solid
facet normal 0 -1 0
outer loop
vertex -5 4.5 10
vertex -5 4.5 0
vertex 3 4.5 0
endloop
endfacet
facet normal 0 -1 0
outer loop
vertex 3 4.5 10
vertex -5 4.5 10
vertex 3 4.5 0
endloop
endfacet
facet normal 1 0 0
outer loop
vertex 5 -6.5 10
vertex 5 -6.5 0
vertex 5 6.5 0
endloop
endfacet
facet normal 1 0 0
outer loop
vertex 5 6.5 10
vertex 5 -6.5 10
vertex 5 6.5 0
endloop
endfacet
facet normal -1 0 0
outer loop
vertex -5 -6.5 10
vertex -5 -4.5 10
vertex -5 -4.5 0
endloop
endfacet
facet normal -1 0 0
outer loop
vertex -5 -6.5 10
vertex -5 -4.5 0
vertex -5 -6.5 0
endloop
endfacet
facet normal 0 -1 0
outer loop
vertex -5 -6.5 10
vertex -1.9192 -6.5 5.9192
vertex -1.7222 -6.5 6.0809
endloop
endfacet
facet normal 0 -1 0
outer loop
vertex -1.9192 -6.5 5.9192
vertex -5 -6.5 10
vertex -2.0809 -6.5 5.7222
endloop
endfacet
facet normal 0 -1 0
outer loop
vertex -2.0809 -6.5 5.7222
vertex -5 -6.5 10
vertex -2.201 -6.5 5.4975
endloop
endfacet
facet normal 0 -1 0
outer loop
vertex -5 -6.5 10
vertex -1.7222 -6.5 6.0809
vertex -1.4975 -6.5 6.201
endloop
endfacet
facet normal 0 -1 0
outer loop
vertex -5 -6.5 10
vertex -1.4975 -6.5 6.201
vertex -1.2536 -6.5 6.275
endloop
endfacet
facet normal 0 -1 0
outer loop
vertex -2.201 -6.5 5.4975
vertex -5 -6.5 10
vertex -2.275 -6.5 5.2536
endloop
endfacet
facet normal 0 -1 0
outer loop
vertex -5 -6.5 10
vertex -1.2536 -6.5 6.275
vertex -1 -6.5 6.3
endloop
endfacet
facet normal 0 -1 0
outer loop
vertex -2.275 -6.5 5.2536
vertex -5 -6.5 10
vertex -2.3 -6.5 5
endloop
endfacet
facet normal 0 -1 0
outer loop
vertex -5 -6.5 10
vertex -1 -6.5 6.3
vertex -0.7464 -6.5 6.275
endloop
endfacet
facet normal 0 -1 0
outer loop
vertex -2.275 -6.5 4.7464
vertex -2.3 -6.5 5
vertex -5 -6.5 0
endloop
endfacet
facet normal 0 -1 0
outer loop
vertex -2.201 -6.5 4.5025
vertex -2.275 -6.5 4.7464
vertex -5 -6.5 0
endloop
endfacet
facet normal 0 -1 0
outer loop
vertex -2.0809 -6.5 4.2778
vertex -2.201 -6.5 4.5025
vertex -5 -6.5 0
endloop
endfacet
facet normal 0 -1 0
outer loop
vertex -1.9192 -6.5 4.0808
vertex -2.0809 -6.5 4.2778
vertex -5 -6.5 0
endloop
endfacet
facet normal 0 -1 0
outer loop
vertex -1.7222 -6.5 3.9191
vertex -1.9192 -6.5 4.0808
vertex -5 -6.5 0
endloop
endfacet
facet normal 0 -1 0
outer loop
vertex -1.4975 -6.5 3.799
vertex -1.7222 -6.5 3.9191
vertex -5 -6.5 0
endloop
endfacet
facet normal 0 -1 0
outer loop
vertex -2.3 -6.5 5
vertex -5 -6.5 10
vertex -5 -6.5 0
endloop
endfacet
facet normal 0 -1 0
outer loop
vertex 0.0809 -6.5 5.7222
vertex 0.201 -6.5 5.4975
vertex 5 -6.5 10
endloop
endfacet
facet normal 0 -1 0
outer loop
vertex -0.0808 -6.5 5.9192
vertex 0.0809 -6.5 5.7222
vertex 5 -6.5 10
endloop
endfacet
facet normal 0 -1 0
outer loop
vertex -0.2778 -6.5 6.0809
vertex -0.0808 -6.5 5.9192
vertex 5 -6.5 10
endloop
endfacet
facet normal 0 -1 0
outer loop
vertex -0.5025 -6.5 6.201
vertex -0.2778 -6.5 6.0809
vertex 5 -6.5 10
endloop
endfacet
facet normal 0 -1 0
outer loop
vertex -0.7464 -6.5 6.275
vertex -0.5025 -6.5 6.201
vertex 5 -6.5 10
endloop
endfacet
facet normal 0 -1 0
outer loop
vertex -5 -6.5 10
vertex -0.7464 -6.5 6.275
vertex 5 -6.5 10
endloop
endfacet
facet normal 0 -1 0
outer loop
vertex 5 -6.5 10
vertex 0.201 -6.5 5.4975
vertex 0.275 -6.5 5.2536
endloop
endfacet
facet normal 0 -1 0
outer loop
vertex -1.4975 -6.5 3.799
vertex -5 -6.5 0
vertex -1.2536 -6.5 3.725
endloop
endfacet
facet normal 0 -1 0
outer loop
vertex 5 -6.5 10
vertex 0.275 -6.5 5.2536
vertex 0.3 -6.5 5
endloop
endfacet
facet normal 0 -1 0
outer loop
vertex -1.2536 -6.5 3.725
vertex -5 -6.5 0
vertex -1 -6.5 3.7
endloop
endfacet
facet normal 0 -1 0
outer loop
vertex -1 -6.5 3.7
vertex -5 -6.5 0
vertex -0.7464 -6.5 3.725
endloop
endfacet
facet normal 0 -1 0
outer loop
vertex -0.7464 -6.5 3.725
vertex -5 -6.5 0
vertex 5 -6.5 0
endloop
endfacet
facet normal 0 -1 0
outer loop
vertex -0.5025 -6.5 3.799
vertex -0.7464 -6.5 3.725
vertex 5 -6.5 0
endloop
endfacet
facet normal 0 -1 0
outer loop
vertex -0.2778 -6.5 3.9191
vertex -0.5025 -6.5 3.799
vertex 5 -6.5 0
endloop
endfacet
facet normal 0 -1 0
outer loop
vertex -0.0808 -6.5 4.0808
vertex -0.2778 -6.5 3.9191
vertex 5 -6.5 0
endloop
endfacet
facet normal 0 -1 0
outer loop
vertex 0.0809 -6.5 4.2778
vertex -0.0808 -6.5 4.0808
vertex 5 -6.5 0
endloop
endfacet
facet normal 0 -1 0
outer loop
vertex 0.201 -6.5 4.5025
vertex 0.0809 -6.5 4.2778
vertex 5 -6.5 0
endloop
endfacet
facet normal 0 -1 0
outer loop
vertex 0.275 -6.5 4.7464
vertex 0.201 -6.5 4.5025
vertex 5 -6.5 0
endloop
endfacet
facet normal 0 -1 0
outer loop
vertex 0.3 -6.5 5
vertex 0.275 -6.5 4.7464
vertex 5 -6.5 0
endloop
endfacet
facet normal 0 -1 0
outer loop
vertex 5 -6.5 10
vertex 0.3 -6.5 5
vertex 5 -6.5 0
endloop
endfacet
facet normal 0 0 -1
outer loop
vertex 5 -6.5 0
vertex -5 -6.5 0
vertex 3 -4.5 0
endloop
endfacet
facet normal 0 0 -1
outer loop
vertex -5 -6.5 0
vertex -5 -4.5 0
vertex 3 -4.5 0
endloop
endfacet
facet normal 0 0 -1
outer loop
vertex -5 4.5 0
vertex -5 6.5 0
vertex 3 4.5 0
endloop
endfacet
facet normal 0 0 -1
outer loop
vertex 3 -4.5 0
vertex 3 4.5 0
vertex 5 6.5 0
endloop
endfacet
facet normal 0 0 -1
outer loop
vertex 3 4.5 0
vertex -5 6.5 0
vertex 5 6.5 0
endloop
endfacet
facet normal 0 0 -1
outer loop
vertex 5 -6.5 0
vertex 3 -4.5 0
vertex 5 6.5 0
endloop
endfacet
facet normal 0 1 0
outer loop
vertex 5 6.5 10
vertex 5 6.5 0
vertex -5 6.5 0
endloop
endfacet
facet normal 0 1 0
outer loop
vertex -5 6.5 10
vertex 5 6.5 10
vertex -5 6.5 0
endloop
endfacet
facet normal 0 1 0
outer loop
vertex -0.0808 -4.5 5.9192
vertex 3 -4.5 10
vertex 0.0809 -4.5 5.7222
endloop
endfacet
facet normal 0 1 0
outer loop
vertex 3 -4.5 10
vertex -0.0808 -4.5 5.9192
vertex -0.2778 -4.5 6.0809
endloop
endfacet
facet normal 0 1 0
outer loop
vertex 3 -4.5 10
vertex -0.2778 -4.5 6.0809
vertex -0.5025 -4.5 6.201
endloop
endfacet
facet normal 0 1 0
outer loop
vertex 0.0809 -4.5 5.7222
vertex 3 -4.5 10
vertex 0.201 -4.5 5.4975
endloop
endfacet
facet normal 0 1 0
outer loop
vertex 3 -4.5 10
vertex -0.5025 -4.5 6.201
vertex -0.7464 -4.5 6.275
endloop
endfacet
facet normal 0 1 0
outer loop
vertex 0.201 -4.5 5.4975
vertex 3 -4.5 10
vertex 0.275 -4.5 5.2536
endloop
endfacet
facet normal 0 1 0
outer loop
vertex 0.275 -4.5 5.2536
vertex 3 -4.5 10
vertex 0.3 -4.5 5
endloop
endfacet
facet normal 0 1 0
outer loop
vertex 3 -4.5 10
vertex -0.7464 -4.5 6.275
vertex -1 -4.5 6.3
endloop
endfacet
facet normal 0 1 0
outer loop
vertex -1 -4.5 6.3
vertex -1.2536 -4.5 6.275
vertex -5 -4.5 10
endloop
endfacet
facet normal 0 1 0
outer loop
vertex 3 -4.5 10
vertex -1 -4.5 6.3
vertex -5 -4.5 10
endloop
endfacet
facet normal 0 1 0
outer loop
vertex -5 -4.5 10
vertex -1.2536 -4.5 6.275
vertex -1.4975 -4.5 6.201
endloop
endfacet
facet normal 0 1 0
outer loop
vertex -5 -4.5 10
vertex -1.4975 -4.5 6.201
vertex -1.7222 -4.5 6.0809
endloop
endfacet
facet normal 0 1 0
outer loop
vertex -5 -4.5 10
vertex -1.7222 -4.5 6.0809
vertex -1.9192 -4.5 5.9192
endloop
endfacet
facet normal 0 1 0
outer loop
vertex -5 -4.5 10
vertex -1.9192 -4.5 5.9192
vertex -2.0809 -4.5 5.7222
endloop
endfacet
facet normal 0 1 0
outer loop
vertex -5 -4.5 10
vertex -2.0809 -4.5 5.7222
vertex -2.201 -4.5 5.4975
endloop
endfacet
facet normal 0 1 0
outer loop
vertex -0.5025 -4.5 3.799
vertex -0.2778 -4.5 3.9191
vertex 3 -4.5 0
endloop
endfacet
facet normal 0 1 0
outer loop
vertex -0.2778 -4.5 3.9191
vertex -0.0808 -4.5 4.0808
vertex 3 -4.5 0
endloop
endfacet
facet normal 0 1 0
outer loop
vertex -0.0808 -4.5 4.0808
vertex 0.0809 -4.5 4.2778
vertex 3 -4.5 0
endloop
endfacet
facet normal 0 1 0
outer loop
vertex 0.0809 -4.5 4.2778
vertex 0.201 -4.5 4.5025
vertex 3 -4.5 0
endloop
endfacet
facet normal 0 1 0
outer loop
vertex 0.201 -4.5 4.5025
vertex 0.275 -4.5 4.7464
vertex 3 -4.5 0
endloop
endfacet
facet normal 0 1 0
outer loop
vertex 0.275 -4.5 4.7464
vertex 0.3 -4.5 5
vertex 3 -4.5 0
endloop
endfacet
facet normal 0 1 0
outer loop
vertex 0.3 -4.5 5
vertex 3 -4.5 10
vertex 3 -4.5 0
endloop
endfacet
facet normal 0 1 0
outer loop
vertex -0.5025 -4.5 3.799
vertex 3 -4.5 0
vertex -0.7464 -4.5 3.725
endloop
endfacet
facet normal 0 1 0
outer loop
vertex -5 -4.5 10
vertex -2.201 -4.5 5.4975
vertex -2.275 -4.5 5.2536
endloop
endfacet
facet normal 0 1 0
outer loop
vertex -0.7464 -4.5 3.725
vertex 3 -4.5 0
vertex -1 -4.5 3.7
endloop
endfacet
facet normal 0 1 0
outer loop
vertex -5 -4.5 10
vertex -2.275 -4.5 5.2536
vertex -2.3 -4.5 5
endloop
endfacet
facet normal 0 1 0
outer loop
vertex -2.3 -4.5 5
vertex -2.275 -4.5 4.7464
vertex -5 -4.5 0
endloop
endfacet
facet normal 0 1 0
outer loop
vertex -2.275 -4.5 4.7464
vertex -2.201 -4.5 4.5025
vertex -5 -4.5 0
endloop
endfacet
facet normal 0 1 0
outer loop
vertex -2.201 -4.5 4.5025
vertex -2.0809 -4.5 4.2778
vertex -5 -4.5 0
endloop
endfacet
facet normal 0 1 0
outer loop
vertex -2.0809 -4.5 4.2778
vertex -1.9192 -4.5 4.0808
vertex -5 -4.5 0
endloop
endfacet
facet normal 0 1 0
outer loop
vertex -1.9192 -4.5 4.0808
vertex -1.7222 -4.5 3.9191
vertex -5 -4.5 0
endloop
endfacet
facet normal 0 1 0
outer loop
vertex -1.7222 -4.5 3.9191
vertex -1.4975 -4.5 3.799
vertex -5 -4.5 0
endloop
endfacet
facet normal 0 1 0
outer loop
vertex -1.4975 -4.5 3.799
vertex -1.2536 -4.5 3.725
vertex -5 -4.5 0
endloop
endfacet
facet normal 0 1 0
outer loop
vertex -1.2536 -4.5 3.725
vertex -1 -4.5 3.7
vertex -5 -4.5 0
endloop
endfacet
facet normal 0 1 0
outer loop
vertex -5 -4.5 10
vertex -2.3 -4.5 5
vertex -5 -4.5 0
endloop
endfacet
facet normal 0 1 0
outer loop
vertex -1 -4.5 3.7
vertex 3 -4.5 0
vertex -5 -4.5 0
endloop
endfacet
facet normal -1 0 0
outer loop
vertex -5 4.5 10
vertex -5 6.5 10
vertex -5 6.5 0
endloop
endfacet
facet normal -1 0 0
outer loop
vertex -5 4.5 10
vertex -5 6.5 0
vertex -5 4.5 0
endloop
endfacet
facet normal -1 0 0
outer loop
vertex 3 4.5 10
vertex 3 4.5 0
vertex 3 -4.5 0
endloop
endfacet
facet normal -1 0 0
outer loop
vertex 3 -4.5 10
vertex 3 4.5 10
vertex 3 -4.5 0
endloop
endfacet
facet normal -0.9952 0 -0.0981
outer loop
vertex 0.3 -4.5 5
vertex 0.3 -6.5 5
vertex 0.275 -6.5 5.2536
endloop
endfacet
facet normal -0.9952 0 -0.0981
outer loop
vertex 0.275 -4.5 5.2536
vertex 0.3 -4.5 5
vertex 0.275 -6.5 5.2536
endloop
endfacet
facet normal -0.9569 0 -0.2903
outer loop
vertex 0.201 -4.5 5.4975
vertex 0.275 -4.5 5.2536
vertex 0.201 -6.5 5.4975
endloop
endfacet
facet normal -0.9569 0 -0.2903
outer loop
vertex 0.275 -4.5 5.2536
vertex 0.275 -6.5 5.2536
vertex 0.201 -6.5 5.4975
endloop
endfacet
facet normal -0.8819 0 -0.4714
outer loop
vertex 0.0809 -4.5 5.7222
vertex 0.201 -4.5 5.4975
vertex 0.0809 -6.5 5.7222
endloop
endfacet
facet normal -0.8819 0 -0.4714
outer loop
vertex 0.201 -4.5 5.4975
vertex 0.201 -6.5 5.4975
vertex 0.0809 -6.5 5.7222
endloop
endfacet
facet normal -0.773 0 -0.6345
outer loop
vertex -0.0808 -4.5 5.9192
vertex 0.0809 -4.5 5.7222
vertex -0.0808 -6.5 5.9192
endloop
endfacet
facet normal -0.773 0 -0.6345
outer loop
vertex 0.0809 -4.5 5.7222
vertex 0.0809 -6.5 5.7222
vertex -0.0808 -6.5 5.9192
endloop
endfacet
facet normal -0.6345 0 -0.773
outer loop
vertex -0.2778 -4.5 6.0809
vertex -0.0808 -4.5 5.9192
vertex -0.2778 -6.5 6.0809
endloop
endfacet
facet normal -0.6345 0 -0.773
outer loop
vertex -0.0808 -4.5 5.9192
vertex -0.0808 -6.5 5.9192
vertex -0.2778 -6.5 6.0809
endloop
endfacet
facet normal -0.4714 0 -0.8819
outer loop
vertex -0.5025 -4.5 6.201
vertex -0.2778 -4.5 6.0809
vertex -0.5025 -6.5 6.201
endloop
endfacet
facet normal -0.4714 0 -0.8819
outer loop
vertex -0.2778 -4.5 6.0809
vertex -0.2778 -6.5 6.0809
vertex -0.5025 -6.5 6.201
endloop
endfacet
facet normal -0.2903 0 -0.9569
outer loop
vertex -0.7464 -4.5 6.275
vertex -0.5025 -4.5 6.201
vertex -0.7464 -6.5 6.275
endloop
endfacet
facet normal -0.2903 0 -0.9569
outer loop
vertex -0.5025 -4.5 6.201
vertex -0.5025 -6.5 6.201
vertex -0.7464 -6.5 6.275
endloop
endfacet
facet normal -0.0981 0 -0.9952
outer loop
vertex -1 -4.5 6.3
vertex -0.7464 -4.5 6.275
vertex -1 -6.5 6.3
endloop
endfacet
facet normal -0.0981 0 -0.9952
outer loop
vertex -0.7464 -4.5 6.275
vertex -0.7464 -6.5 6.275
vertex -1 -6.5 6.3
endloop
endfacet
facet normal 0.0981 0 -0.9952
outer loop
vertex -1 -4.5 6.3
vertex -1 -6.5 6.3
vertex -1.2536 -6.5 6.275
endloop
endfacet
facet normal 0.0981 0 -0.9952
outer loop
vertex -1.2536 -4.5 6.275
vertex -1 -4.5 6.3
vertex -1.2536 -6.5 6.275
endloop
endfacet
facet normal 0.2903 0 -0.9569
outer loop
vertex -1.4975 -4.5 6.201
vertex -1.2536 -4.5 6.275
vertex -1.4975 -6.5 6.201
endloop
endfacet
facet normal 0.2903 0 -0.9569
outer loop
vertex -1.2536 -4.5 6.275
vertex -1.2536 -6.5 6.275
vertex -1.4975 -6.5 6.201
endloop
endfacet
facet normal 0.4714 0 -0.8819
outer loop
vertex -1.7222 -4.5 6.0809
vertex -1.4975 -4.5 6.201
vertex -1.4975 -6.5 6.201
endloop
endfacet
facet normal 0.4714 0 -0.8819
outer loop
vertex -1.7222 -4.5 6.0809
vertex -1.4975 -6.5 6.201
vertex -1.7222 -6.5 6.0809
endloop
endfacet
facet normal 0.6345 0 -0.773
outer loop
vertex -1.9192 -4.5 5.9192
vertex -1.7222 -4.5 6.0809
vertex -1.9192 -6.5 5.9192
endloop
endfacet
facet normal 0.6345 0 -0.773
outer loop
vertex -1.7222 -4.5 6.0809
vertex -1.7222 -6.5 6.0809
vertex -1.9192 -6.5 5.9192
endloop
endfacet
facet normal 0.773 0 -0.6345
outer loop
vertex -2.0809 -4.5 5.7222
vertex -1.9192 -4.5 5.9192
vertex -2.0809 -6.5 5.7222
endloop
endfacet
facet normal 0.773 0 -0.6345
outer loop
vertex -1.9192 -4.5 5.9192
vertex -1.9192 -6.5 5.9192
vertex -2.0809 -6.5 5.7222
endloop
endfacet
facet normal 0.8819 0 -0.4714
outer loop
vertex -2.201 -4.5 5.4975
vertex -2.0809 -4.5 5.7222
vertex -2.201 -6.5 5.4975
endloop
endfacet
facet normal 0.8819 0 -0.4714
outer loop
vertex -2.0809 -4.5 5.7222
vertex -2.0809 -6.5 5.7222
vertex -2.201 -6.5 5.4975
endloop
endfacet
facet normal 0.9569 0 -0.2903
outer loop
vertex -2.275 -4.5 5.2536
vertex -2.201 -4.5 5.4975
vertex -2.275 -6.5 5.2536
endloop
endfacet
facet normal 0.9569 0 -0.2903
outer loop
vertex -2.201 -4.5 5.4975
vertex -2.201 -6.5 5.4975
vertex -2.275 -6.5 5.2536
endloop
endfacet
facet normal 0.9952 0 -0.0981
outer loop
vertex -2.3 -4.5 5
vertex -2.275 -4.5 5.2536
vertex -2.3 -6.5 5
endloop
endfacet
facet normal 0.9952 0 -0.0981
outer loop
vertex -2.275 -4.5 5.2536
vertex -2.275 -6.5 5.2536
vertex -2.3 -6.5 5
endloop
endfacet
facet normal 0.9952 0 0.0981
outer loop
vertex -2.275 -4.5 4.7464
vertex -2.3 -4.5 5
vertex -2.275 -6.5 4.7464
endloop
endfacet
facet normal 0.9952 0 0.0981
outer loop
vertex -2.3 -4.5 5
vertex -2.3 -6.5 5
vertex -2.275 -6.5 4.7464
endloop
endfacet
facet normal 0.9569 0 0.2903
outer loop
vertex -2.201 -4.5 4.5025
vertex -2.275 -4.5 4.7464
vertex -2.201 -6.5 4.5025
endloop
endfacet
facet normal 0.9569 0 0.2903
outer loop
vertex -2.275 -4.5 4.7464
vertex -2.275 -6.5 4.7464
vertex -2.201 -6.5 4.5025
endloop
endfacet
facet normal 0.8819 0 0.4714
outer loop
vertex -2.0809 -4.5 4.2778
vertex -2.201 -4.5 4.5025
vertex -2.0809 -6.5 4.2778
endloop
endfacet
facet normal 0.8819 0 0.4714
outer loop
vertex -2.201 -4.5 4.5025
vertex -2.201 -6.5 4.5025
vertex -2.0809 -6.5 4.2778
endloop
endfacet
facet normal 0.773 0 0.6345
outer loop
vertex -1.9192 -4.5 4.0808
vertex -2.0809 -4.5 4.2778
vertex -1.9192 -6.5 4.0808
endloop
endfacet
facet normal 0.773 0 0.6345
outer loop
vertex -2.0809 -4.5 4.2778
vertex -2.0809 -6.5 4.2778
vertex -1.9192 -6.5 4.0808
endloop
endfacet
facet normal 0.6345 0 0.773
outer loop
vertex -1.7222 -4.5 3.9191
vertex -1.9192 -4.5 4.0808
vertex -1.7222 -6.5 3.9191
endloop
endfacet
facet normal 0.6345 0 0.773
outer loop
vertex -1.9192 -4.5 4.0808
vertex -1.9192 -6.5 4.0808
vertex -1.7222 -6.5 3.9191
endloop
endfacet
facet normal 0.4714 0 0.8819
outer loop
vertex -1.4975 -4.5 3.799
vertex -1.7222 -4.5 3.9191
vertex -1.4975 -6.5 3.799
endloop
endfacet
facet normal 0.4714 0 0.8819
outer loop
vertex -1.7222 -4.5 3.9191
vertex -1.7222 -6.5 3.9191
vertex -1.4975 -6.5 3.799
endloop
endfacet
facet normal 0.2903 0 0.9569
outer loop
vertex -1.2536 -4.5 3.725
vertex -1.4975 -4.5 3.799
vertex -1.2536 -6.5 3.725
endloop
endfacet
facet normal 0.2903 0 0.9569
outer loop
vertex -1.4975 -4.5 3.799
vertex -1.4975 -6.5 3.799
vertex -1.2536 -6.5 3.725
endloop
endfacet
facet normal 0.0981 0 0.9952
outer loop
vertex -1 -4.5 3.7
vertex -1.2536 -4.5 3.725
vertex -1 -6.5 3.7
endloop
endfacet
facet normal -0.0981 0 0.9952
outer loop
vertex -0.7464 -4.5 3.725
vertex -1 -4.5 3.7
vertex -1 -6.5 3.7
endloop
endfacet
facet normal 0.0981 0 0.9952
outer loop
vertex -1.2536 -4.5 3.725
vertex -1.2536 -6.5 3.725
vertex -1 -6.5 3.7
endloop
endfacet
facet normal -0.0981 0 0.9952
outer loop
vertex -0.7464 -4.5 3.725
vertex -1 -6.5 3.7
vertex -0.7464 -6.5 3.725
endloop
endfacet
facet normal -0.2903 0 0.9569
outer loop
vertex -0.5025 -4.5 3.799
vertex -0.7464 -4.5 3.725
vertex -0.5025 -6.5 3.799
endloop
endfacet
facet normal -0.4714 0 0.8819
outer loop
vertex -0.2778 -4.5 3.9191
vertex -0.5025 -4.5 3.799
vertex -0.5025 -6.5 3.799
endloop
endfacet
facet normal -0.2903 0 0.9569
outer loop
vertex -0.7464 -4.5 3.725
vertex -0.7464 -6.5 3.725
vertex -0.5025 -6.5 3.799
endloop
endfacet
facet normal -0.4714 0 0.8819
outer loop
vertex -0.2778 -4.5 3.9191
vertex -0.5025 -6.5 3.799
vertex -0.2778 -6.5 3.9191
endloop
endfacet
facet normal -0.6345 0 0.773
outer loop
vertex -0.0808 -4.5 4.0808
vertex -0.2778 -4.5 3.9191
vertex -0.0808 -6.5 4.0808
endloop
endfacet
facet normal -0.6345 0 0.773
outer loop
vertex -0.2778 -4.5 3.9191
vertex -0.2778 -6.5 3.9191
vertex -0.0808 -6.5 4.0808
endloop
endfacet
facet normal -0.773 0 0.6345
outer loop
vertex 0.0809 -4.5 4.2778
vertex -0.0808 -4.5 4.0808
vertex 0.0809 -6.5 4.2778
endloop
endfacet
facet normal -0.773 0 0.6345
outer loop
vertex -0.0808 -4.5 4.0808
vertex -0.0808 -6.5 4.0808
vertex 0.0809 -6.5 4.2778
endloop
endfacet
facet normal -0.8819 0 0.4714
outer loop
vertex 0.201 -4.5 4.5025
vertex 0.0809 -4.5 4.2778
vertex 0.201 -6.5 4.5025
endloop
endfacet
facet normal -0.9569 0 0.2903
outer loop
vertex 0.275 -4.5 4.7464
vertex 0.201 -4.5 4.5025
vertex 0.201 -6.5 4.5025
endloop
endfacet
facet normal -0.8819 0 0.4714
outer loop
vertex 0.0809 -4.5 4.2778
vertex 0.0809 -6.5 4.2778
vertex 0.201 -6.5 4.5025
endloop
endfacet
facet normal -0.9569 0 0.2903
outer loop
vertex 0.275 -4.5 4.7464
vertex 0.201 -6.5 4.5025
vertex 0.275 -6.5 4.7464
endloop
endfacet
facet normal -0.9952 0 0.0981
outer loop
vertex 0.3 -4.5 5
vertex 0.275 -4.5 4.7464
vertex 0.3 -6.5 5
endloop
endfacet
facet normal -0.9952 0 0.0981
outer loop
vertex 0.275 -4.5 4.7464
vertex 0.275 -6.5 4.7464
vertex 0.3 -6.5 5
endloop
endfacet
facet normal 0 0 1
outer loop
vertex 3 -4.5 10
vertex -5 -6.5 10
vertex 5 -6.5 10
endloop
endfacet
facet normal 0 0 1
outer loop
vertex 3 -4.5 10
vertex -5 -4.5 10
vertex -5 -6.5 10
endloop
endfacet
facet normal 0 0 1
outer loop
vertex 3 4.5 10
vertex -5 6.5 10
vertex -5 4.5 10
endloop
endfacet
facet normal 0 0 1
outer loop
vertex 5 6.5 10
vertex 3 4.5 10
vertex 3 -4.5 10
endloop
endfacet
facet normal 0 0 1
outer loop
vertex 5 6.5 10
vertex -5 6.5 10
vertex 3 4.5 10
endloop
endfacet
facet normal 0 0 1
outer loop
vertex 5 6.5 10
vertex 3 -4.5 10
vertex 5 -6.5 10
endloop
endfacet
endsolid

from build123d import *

# Parameters (mm, degrees)
F1_DEPTH = 10
F2_R     = 1.3
F3_DEPTH = 2


# Not quite as in the source:
# - a feature names something its author has since deleted; it is built from what else it names


with BuildPart() as f1:
    # F0 (on Top) → F1 (new body)
    with BuildSketch(Plane.XY):
        Polygon((-5, -6.5), (5, -6.5), (5, 6.5), (-5, 6.5), (-5, 4.5), (-3, 4.5), (3, 4.5), (3, -4.5), (-3, -4.5), (-5, -4.5), align=None)
    extrude(amount=F1_DEPTH)

    # F2 (on face) → F3 (cut, through all)
    with BuildSketch(Plane.XZ.offset(6.5)):
        with Locations((-1, 5)):
            Circle(F2_R)
    extrude(amount=-F3_DEPTH, mode=Mode.SUBTRACT)


solid = f1.part
